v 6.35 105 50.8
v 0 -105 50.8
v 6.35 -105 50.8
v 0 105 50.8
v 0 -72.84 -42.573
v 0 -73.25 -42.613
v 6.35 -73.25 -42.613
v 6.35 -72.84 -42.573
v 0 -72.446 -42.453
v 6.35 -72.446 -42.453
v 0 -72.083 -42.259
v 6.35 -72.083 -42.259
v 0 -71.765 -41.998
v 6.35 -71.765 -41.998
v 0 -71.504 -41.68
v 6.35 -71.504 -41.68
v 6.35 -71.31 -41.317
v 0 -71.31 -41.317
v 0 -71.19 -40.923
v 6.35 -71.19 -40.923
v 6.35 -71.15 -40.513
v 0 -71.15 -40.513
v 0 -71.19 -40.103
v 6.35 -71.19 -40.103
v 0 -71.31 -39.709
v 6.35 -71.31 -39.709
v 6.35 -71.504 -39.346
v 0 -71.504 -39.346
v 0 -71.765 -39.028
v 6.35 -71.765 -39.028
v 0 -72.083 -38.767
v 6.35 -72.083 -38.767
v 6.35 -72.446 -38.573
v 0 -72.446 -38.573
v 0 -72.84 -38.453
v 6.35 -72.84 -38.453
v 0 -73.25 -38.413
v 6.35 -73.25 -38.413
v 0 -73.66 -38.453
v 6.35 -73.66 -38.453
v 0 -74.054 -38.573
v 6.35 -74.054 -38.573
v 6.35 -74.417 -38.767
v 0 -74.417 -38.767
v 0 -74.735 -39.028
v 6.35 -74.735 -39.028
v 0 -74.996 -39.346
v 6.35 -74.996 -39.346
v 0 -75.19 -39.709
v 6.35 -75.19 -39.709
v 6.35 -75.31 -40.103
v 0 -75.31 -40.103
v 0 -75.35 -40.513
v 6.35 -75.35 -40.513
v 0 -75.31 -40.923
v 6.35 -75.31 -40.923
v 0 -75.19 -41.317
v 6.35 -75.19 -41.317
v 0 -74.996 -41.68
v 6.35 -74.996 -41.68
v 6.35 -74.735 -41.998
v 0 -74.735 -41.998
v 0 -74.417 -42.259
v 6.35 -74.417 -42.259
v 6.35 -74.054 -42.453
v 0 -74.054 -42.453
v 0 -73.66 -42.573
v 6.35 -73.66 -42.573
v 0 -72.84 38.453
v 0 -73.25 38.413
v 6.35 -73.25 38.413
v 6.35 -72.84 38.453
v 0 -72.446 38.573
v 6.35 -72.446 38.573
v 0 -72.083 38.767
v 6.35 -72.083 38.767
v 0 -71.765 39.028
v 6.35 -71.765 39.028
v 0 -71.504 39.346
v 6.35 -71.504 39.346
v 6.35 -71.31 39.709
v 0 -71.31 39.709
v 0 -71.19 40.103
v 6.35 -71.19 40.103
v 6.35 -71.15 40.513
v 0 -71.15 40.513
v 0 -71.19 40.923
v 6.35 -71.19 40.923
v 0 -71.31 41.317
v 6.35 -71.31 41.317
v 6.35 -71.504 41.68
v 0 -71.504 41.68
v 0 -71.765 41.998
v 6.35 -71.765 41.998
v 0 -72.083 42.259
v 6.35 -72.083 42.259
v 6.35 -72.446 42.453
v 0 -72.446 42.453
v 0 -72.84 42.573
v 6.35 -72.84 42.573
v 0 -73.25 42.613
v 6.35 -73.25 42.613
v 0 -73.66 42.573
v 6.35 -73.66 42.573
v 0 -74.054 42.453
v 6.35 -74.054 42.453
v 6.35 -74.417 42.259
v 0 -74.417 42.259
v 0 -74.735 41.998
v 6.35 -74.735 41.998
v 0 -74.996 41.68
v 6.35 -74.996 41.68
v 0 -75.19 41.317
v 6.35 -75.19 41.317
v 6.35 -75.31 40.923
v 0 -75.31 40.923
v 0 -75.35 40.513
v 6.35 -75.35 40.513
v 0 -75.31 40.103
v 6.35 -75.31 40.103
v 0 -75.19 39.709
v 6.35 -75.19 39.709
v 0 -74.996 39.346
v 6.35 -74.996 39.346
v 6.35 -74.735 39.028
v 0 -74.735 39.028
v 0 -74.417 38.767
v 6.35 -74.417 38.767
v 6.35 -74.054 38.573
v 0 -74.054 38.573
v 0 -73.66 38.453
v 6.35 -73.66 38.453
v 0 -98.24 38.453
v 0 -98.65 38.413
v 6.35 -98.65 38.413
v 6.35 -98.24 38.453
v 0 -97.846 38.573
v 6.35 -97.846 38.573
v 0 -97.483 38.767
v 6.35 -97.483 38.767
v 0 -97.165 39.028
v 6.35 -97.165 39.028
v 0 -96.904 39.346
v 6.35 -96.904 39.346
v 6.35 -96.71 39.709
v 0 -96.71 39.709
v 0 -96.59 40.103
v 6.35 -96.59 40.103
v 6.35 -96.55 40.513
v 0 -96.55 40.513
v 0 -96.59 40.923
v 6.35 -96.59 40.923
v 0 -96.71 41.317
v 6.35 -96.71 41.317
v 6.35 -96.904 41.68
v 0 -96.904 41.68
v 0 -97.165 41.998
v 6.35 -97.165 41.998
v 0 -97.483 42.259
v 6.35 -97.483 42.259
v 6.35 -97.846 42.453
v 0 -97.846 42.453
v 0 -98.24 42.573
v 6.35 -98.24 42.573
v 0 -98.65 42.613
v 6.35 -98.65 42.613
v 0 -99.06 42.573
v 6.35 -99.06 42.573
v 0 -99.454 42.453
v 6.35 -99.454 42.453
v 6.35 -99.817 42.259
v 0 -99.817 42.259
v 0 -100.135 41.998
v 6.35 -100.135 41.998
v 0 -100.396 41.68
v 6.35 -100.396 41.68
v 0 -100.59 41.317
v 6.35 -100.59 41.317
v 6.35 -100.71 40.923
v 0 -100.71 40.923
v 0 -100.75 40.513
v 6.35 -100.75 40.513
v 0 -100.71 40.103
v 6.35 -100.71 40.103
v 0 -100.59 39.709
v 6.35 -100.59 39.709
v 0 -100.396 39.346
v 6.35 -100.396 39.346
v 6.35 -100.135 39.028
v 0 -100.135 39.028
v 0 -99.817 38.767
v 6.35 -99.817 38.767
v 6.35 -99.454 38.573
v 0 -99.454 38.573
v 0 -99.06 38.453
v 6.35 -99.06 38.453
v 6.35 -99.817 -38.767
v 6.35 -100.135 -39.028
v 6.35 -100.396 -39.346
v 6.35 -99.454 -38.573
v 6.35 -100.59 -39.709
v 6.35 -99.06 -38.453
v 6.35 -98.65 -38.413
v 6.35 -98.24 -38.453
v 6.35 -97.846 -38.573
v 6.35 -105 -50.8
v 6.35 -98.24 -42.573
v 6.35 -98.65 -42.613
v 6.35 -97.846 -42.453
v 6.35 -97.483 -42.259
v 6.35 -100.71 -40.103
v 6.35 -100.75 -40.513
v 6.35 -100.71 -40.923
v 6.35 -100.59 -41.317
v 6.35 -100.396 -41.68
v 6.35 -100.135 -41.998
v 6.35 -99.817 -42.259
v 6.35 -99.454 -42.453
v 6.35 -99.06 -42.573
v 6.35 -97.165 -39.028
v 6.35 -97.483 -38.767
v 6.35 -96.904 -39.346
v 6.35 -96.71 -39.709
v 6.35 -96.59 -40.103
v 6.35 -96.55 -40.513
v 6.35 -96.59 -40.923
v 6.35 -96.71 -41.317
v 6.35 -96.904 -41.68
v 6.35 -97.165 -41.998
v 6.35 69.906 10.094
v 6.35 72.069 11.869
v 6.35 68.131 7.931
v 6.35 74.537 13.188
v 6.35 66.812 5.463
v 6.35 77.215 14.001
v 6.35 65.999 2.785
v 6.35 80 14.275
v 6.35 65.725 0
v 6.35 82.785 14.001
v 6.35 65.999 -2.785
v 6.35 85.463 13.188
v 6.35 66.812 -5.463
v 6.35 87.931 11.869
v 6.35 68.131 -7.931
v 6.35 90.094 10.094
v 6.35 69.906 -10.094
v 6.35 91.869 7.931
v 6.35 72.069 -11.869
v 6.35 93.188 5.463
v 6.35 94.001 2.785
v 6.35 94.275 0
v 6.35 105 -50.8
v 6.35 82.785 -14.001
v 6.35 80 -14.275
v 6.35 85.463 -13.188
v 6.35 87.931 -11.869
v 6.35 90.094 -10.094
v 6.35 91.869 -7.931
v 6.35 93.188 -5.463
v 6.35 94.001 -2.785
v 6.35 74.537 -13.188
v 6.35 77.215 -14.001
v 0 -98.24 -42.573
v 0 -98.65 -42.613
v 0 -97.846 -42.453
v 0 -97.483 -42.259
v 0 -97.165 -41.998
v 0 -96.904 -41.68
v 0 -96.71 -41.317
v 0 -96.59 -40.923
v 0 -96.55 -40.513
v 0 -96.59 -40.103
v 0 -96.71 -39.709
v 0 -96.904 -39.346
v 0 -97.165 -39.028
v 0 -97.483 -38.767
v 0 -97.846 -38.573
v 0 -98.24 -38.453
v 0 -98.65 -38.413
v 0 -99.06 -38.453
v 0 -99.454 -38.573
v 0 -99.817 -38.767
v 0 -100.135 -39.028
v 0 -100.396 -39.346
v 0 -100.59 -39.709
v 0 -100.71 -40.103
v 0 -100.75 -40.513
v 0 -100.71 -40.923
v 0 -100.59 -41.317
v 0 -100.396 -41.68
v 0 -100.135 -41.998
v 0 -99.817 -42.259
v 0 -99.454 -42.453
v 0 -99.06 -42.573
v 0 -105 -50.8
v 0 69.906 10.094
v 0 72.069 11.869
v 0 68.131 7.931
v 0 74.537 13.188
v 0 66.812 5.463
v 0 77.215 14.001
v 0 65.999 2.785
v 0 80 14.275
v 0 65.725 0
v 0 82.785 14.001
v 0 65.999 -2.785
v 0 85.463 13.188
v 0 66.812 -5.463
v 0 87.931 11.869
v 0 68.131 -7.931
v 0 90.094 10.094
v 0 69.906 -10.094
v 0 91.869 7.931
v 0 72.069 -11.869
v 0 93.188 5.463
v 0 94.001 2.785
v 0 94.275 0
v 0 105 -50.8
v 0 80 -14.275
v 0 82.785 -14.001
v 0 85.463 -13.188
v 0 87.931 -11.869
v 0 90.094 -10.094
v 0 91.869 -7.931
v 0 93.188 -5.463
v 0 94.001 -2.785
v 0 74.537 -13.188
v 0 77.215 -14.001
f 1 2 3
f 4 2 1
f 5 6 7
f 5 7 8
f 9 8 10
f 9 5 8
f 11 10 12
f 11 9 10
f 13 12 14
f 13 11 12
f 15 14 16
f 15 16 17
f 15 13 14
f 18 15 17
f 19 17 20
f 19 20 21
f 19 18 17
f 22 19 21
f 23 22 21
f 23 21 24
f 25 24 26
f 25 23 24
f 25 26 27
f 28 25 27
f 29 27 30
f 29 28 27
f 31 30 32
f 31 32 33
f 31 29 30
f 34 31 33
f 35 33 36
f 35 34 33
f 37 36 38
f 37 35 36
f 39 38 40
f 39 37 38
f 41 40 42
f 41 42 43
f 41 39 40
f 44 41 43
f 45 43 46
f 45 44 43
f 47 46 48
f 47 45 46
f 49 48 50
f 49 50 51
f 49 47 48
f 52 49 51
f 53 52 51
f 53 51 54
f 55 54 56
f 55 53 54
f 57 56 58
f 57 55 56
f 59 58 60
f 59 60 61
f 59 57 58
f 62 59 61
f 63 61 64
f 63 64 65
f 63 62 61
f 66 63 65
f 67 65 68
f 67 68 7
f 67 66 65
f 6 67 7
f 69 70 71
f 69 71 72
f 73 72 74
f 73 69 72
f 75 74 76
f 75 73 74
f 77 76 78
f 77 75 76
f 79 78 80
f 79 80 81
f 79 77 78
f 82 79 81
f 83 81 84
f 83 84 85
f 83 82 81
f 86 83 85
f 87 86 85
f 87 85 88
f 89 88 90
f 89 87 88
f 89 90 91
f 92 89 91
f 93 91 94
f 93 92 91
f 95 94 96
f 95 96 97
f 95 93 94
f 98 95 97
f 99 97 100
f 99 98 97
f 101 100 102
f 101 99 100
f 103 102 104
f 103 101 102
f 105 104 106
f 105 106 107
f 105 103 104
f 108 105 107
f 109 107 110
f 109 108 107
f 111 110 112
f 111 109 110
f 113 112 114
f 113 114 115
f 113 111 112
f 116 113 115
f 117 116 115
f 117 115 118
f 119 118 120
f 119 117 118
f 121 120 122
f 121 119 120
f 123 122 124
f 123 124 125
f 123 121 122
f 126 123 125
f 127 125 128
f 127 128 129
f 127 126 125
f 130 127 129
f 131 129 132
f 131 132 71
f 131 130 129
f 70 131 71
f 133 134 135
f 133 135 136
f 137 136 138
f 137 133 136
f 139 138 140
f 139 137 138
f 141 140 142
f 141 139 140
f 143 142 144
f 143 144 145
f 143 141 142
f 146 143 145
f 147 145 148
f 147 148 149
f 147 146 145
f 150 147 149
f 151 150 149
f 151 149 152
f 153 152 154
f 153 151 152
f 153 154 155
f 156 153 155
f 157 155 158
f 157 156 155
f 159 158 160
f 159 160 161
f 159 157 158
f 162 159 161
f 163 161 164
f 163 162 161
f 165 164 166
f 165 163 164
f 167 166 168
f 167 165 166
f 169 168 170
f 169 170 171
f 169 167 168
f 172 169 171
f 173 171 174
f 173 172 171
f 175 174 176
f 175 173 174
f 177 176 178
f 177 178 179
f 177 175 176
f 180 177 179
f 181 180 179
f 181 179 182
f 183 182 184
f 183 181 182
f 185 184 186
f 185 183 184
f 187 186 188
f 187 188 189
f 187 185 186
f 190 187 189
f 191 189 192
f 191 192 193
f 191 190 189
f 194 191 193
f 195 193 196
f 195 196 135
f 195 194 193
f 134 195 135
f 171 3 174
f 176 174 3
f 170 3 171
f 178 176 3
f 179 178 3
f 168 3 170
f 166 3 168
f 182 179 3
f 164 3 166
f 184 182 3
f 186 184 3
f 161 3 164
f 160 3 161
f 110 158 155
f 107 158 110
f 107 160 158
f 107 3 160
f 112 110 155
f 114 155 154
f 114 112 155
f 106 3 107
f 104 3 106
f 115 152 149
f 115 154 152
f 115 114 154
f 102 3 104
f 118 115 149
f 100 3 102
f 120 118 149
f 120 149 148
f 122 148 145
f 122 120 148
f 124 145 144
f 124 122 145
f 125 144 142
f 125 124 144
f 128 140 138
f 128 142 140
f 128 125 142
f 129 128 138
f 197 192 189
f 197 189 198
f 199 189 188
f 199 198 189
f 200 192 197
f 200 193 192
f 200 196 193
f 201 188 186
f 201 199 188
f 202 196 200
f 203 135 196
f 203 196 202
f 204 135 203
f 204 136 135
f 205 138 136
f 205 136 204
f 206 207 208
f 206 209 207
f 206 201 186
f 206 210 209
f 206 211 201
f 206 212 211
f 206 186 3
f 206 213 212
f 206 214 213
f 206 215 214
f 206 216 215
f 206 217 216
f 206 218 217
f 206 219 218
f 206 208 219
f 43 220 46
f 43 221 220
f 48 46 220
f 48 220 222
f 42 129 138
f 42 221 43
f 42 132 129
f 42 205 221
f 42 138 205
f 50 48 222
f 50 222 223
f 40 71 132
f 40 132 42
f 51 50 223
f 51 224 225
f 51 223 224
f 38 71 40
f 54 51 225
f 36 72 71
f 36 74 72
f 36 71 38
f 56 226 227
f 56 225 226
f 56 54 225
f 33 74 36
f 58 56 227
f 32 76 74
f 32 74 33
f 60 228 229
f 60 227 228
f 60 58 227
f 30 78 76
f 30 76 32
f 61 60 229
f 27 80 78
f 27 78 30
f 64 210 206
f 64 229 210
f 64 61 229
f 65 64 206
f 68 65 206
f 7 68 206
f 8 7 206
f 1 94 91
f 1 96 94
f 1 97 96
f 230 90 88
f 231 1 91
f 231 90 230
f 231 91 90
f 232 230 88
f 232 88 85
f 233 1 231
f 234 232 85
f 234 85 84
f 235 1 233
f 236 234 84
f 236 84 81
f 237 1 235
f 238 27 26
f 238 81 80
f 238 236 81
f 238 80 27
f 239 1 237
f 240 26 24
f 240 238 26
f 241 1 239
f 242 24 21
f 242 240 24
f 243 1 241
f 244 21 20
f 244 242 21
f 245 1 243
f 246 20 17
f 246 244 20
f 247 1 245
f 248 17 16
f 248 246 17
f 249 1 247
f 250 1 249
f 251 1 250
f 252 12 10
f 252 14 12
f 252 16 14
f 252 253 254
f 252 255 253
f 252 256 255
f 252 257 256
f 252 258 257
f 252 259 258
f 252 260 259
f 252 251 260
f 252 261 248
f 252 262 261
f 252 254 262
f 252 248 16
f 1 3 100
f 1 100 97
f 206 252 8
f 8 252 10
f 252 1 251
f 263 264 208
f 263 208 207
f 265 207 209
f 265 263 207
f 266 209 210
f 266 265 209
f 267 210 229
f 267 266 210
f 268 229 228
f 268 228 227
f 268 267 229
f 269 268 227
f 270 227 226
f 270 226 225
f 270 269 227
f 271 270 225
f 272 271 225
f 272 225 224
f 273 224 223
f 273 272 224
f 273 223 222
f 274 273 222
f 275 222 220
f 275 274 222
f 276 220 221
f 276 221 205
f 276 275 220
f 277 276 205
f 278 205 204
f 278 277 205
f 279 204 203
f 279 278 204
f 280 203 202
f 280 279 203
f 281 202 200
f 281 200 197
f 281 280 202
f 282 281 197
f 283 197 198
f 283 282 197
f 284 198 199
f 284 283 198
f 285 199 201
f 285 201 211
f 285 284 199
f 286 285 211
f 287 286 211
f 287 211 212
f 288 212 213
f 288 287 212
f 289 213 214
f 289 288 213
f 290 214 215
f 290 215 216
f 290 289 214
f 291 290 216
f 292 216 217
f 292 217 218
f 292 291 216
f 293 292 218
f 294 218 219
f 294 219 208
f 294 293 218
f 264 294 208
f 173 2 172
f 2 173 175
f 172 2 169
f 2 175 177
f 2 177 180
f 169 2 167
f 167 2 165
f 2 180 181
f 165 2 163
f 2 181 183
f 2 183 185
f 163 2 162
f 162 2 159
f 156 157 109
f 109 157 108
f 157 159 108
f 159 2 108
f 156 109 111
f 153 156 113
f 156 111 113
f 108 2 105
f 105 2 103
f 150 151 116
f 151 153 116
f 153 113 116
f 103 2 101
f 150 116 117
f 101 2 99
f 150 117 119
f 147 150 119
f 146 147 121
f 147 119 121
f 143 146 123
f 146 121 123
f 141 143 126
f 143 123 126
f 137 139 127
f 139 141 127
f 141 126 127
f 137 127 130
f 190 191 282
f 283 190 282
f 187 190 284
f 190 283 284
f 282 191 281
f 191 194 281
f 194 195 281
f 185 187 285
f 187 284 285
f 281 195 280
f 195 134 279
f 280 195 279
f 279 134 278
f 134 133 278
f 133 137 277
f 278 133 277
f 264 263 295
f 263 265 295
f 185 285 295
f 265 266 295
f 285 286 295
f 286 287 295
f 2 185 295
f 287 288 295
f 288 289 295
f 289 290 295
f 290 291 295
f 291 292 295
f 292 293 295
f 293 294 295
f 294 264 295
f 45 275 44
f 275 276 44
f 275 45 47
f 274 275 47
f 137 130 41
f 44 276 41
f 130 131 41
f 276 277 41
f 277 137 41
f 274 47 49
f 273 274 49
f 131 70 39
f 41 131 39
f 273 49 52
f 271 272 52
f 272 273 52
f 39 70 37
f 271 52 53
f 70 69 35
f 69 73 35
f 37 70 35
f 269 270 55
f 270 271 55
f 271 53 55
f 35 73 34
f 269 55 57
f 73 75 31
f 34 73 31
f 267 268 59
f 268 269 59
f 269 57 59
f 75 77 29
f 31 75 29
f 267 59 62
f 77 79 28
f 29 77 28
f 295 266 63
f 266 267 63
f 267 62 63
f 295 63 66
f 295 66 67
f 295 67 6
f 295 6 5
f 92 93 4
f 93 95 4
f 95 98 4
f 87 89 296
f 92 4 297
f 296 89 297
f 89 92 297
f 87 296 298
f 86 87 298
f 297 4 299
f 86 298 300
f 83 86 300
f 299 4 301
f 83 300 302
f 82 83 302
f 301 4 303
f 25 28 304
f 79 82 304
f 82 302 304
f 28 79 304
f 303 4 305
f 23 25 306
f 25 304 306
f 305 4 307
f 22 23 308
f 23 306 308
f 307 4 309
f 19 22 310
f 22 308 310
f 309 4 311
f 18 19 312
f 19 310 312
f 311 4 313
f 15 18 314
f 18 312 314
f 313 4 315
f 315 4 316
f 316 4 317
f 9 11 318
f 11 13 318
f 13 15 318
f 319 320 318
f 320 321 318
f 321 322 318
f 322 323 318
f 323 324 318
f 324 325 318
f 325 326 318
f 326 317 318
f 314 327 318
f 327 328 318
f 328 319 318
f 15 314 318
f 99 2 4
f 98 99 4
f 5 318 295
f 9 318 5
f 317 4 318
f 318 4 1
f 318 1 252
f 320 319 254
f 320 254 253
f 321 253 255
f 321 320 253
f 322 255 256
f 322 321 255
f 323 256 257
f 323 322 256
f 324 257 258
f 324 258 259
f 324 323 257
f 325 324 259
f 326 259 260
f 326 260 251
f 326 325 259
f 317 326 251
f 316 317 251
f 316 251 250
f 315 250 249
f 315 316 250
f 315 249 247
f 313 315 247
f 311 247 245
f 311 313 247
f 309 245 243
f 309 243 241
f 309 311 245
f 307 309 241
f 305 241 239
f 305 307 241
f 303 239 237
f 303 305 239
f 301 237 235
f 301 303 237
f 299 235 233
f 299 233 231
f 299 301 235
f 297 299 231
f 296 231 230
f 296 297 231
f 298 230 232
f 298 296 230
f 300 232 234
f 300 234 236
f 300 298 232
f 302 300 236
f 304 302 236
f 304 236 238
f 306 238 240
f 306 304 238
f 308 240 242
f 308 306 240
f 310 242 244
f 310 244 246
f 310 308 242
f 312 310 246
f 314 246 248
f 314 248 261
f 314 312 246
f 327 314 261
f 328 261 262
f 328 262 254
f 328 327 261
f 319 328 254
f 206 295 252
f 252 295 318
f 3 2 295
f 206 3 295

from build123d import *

# Parameters (mm, degrees)
SKETCH1_W           = 101.6
SKETCH1_H           = 210
SKETCH1_R           = 2.1
SKETCH1_R_2         = 14.275
BOSS_EXTRUDE1_DEPTH = 6.35


with BuildPart() as part:
    # Sketch1 → Boss-Extrude1 (new body)
    with BuildSketch(Plane(origin=(0, 0, 0), x_dir=(0, 0, -1), z_dir=(1, 0, 0))):
        Rectangle(SKETCH1_W, SKETCH1_H)
        with Locations((-40.513, -98.65)):
            Circle(SKETCH1_R, mode=Mode.SUBTRACT)
        with Locations((40.513, -98.65)):
            Circle(SKETCH1_R, mode=Mode.SUBTRACT)
        with Locations((0, 80)):
            Circle(SKETCH1_R_2, mode=Mode.SUBTRACT)
        with Locations((-40.513, -73.25)):
            Circle(SKETCH1_R, mode=Mode.SUBTRACT)
        with Locations((40.513, -73.25)):
            Circle(SKETCH1_R, mode=Mode.SUBTRACT)
    extrude(amount=BOSS_EXTRUDE1_DEPTH)


solid = part.part
